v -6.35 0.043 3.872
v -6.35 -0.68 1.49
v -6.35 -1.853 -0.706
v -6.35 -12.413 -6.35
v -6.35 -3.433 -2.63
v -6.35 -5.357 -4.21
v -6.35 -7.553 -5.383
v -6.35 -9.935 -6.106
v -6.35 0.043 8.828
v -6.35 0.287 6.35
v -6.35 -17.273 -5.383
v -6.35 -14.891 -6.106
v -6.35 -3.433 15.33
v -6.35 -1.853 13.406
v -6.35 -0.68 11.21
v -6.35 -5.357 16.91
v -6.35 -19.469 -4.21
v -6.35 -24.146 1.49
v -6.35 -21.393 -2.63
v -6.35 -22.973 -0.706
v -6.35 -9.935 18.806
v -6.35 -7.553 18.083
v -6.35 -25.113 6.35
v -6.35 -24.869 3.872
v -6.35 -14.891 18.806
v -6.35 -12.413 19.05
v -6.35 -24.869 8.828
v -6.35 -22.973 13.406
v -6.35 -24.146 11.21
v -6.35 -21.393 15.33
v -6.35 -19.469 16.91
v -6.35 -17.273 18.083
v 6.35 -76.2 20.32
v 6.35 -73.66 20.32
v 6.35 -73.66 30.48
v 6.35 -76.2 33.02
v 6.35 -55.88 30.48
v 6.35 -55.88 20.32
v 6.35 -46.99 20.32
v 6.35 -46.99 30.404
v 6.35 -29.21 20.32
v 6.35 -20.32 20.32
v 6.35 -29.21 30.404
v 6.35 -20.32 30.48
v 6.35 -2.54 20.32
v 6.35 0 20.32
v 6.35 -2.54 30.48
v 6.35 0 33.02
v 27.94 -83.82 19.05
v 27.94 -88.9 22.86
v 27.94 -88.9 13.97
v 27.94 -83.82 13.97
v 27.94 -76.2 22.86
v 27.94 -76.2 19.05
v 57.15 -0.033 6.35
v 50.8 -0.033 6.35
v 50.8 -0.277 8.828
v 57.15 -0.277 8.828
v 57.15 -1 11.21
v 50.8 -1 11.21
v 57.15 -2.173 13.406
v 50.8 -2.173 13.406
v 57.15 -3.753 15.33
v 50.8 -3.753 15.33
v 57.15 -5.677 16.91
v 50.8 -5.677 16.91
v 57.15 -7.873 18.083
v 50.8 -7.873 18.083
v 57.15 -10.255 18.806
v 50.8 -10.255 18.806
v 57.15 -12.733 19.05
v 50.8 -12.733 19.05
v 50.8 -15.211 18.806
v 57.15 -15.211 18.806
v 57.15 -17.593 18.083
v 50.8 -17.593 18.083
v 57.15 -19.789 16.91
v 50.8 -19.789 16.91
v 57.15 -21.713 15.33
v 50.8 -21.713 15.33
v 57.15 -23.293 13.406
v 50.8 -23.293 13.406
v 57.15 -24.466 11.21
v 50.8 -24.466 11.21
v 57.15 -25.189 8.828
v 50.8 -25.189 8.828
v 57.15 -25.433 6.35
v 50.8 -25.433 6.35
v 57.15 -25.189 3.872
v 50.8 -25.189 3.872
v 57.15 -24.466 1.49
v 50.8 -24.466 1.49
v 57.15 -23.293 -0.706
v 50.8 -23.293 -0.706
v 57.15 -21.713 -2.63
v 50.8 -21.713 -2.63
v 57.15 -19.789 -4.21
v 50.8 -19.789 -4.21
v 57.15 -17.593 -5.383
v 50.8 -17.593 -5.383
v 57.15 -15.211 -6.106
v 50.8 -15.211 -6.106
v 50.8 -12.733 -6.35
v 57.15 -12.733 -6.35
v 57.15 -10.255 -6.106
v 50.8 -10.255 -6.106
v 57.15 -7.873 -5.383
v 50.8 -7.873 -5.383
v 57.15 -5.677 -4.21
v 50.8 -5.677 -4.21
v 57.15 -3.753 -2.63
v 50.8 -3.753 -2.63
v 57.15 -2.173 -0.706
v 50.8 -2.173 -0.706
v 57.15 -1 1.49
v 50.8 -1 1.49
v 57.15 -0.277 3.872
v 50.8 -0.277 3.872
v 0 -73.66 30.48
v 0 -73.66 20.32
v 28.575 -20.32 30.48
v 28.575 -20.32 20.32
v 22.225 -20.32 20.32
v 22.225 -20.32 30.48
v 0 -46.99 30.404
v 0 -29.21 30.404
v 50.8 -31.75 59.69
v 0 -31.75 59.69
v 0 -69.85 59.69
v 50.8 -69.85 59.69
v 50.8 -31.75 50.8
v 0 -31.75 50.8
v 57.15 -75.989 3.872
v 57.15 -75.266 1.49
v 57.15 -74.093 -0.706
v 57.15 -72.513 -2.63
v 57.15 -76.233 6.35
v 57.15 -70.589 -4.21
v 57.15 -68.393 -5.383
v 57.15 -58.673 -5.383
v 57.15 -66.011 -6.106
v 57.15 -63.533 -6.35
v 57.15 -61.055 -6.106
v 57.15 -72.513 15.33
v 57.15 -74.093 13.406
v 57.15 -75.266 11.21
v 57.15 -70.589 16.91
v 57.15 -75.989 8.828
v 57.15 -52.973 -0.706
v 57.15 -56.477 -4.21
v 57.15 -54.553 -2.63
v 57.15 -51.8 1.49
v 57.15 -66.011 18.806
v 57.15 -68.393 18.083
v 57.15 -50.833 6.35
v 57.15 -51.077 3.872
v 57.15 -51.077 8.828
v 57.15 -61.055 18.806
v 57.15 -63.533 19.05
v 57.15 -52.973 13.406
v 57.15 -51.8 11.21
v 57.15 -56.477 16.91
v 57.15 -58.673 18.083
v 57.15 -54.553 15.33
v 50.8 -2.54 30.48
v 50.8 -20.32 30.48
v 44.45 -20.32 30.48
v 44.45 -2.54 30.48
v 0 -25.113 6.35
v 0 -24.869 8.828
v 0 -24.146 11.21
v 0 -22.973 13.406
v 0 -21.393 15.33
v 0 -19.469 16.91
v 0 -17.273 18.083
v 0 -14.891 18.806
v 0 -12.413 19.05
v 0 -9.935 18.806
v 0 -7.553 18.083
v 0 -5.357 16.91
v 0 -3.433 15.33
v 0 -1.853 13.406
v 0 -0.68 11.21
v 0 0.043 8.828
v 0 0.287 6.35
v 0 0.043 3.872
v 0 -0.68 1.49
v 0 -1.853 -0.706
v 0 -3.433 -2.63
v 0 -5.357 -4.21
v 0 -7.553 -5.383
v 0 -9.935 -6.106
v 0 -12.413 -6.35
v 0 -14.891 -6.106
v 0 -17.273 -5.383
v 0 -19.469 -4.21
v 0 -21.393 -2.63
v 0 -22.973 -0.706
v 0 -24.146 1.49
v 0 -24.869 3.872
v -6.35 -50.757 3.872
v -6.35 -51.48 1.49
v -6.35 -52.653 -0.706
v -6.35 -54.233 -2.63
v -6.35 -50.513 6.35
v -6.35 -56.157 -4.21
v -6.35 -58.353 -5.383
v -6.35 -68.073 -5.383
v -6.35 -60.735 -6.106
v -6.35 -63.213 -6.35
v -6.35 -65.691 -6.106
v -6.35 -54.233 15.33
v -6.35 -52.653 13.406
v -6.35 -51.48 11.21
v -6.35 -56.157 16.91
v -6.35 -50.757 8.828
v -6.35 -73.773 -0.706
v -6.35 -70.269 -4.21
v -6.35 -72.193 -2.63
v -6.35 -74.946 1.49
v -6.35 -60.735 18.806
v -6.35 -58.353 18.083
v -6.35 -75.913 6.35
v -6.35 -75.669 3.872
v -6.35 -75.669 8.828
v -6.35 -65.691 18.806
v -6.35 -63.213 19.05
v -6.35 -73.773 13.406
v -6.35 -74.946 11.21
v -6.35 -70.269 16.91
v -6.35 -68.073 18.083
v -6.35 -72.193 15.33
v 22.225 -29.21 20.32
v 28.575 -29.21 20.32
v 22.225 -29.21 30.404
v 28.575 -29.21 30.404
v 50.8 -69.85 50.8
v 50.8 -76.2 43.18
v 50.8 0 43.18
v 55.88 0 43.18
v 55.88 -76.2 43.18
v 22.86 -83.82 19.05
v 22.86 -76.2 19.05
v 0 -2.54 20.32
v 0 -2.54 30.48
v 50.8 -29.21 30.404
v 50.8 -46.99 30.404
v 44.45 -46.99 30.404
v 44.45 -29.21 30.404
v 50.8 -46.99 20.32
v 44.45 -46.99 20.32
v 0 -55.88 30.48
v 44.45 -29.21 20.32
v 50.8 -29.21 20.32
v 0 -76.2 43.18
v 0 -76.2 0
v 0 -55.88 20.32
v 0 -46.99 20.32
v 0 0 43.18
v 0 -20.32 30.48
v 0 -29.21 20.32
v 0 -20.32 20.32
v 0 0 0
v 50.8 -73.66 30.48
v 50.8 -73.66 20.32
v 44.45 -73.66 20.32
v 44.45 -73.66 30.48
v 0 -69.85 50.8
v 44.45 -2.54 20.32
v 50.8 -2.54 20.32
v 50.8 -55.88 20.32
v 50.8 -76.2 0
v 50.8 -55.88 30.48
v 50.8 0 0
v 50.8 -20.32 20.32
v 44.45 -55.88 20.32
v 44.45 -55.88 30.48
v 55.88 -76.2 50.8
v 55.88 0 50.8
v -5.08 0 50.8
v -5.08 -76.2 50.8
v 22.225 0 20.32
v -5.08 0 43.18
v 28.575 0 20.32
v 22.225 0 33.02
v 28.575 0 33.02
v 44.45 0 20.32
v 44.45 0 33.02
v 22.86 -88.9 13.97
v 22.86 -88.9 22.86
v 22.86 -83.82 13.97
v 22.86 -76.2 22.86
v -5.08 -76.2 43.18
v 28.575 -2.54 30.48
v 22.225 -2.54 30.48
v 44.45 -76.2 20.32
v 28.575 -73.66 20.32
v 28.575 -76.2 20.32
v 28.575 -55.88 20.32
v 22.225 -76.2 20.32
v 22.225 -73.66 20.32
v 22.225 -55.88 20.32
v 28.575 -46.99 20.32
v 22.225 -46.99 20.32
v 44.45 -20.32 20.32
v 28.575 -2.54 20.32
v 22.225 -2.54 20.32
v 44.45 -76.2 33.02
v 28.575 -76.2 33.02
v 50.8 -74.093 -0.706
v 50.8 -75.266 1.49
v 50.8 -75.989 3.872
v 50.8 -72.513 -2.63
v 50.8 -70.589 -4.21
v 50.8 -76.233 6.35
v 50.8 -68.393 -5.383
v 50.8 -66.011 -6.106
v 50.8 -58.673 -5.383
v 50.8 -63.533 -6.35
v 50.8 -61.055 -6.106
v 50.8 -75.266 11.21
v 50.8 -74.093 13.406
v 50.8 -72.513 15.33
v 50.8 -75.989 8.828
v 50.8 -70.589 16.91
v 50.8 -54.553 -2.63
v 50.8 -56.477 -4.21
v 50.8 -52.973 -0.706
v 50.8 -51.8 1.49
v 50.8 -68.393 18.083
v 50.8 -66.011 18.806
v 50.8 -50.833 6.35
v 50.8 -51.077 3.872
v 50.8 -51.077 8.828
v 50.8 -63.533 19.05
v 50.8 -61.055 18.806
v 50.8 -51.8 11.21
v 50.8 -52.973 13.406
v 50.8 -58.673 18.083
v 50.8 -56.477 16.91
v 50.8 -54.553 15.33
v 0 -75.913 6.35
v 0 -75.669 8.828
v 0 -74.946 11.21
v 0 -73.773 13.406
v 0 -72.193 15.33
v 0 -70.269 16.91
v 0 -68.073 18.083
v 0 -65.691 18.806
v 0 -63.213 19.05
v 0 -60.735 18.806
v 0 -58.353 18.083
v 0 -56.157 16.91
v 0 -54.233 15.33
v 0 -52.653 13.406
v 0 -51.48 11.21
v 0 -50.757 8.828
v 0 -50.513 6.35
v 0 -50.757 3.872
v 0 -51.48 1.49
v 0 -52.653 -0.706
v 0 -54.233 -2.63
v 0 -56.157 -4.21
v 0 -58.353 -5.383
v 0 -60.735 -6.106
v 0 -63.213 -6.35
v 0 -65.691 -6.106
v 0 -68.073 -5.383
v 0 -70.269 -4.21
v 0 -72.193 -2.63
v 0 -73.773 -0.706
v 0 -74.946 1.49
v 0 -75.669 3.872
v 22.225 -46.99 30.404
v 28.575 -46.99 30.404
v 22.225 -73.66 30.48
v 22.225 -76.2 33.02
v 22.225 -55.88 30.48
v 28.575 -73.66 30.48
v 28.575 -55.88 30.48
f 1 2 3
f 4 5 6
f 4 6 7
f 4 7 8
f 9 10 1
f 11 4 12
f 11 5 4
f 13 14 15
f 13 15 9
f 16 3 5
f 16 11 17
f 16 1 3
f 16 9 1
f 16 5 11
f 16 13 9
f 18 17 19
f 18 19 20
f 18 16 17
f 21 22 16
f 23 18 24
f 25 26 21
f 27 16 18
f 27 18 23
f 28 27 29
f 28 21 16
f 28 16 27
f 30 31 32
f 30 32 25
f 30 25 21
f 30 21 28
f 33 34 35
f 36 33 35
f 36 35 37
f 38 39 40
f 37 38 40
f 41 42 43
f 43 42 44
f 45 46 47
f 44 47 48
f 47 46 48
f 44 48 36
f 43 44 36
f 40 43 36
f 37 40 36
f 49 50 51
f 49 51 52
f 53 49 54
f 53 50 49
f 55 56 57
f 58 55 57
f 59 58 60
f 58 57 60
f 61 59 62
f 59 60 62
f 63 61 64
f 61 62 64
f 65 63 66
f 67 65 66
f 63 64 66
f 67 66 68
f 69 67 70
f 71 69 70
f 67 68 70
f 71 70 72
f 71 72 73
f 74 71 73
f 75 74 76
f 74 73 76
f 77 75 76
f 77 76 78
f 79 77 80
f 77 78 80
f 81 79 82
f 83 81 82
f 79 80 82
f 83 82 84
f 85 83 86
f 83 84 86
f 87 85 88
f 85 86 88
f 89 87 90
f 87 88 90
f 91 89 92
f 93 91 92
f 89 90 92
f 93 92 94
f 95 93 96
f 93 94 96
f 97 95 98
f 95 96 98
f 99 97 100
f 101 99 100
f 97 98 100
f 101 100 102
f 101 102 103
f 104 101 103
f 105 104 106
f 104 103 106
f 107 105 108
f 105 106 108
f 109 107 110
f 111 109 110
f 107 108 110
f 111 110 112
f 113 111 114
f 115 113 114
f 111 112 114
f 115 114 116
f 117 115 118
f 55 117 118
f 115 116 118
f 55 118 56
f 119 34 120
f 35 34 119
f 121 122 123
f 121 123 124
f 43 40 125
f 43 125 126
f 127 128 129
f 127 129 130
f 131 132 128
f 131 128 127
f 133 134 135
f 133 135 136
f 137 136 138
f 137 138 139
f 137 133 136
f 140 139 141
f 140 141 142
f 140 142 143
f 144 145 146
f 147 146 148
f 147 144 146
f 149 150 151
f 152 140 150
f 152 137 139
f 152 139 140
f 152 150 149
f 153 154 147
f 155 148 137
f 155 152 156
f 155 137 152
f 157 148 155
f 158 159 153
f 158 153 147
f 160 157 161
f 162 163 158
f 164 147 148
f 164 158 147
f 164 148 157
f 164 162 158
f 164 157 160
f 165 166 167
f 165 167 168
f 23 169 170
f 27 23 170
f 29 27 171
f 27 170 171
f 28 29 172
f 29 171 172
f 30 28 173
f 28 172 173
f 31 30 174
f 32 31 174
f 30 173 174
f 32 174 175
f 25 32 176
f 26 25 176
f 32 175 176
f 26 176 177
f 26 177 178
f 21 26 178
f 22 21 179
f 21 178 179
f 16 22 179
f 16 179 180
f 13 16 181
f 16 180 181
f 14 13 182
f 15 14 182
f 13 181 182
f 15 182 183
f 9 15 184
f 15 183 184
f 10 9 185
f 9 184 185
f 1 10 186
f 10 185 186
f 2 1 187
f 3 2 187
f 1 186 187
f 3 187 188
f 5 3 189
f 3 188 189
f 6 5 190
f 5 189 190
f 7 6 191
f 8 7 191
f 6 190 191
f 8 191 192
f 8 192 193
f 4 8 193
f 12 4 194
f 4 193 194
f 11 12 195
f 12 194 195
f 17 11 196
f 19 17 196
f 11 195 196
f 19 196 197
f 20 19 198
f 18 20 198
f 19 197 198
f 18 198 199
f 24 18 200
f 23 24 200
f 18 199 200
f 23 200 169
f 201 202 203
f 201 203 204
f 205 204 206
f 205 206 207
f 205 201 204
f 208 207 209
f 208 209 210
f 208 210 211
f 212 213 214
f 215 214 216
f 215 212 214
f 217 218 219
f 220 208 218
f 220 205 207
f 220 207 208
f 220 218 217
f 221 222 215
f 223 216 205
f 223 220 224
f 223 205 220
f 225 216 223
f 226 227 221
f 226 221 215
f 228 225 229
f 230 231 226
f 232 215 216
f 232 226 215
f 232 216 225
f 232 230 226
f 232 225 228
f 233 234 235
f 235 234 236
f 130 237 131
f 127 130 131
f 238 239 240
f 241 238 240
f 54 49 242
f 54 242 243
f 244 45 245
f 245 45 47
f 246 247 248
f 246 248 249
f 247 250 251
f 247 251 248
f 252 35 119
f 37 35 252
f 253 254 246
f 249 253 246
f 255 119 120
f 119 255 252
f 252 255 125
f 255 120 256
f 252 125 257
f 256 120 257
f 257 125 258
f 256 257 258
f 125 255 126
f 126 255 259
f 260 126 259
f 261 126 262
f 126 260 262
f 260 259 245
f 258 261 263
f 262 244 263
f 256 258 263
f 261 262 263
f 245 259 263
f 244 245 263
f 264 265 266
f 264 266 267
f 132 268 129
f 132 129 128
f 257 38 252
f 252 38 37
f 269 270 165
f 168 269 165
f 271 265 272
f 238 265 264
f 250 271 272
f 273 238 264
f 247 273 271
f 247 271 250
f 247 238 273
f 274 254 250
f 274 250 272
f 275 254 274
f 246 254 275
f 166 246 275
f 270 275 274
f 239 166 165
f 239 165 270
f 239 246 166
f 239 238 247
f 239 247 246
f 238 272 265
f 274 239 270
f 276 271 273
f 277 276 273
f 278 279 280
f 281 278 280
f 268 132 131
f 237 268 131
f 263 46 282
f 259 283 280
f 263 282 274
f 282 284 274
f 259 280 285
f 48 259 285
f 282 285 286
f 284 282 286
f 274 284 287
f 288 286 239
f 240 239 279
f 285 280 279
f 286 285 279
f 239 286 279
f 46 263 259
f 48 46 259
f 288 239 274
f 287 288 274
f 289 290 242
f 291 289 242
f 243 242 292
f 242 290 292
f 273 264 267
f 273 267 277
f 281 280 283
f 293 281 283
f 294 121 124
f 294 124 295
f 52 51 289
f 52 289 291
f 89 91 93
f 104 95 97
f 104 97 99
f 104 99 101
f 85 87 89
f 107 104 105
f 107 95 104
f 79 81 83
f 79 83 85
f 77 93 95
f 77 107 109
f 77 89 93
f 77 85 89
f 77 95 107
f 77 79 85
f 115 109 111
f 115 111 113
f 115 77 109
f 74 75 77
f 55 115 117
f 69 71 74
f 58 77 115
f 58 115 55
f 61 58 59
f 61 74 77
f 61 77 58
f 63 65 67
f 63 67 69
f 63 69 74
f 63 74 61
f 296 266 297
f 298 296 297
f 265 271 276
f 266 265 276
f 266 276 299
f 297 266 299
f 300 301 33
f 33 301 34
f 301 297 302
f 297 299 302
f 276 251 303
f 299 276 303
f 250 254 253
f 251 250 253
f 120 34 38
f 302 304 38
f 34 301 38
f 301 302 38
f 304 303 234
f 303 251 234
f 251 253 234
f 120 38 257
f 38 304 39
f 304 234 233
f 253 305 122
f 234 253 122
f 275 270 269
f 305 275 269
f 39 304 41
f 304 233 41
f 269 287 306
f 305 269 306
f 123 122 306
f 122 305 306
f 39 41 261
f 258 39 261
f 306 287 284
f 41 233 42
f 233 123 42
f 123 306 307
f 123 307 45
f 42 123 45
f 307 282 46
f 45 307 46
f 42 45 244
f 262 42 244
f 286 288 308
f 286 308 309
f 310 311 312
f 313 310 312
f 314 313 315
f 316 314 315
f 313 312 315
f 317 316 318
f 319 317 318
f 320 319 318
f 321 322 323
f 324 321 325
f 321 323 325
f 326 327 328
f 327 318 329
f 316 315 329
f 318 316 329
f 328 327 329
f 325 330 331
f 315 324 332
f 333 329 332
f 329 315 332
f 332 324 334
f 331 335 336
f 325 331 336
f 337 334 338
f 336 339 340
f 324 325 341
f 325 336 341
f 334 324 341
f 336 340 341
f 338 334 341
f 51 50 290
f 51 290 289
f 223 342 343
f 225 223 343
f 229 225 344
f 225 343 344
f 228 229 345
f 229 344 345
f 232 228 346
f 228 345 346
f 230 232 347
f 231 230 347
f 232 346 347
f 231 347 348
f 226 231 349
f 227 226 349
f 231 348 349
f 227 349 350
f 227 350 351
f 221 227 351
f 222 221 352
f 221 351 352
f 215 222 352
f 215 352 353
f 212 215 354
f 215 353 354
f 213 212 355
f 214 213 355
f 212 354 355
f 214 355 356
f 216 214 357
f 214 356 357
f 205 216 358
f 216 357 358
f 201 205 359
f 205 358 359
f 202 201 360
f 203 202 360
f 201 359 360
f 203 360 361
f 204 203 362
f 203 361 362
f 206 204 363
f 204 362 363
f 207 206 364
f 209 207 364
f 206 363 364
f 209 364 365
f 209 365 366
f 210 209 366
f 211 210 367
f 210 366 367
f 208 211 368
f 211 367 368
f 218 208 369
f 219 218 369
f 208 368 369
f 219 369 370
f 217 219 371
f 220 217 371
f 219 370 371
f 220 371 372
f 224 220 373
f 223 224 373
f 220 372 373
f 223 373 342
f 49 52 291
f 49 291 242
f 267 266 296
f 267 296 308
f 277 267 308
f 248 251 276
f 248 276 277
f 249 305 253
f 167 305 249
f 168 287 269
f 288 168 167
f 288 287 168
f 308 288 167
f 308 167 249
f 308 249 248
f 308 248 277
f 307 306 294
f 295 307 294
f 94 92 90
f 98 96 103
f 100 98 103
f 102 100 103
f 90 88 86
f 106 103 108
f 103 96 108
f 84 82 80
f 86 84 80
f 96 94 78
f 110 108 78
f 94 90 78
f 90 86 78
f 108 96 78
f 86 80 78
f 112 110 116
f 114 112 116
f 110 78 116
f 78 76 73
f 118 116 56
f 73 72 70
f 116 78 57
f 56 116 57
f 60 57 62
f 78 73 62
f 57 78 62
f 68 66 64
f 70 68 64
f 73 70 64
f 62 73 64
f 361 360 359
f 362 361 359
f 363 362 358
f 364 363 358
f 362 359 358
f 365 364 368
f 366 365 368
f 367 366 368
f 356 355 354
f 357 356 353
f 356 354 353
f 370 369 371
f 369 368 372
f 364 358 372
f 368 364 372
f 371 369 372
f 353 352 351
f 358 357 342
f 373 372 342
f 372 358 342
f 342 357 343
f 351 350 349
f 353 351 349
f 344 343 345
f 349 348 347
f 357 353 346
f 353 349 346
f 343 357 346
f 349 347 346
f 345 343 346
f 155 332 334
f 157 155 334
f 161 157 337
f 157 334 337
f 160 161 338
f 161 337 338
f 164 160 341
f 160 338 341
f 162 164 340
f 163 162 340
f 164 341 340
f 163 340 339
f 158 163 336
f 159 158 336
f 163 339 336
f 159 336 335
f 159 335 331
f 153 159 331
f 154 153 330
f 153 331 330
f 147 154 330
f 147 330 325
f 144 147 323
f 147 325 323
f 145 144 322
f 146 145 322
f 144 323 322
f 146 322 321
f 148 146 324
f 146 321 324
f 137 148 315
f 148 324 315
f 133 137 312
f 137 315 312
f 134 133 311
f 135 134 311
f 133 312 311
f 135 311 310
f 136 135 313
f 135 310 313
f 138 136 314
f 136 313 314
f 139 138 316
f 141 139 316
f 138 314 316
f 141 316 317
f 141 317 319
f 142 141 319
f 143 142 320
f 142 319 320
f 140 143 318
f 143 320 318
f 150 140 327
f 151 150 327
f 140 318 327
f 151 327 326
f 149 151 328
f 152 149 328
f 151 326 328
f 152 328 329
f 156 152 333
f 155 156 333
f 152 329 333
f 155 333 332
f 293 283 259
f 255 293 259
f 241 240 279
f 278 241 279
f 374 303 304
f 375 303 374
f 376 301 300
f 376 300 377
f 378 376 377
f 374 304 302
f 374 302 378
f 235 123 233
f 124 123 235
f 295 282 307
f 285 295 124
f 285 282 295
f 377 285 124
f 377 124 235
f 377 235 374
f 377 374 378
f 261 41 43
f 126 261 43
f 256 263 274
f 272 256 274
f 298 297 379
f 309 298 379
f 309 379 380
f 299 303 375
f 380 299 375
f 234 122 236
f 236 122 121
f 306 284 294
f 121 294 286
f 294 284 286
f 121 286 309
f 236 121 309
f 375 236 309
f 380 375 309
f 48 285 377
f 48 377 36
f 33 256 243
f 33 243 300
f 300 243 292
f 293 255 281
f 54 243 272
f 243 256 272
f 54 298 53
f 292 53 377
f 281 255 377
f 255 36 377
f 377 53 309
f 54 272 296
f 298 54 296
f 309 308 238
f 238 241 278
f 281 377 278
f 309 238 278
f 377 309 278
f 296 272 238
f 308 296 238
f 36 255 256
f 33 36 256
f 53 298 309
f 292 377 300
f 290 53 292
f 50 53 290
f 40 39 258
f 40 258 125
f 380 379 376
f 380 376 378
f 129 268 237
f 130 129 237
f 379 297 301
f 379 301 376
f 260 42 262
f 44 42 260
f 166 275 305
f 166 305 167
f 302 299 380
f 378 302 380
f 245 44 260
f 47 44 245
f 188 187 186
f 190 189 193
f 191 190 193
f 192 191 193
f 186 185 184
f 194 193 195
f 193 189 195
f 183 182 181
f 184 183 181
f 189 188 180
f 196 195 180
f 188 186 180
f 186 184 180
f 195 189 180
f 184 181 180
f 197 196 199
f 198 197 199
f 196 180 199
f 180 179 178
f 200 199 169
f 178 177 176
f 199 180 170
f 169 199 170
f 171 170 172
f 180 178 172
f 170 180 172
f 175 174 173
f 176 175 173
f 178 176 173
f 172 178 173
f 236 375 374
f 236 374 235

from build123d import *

# Parameters (mm, degrees)
F1_DEPTH  = 76.2
F2_W      = 17.78
F2_H      = 10.16
F2_H_2    = 10.084178
F3_DEPTH  = 50.8
F4_R      = 12.7
F5_DEPTH  = 6.35
F7_W      = 15.875
F7_H      = 12.7
F8_DEPTH  = 76.2
F9_W      = 50.8
F9_H      = 38.1
F10_DEPTH = 8.89
F12_DEPTH = 27.94
F13_DEPTH = 22.86
F6_R      = 12.7
F14_DEPTH = 6.35


with BuildPart() as f1:
    # F0 (on Front) → F1 (new body)
    with BuildSketch(Plane.XZ):
        Polygon((55.88, 50.8), (0, 50.8), (-5.08, 50.8), (-5.08, 43.18), (0, 43.18), (0, 0), (50.8, 0), (50.8, 43.18), (55.88, 43.18), align=None)
    extrude(amount=F1_DEPTH)

    # F2 (on face) → F3 (cut)
    with BuildSketch(Plane.YZ.offset(50.8)):
        with Locations((-64.77, 25.4)):
            Rectangle(F2_W, F2_H)
        with Locations((-38.1, 25.362089)):
            Rectangle(F2_W, F2_H_2)
        with Locations((-11.43, 25.4)):
            Rectangle(F2_W, F2_H)
    extrude(amount=-F3_DEPTH, mode=Mode.SUBTRACT)

    # F7 (on face) → F8 (cut)
    with BuildSketch(Plane(origin=(0, 0, 0), x_dir=(-1, 0, 0), z_dir=(0, 1, 0))):
        with Locations((-36.5125, 26.67)):
            Rectangle(F7_W, F7_H)
        with Locations((-14.2875, 26.67)):
            Rectangle(F7_W, F7_H)
    extrude(amount=-F8_DEPTH, mode=Mode.SUBTRACT)

    # F11 (on face) → F12 (join)
    with BuildSketch(Plane.YZ.offset(50.8)):
        Polygon((-76.2, 19.05), (-76.2, 22.86), (-88.9, 22.86), (-88.9, 13.97), (-83.82, 13.97), (-83.82, 19.05), align=None)
    extrude(amount=-F12_DEPTH)

    # F11 (on face) → F13 (cut)
    with BuildSketch(Plane.YZ.offset(50.8)):
        Polygon((-76.2, 19.05), (-76.2, 22.86), (-88.9, 22.86), (-88.9, 13.97), (-83.82, 13.97), (-83.82, 19.05), align=None)
    extrude(amount=-F13_DEPTH, mode=Mode.SUBTRACT)


with BuildPart() as f5:
    # F4 (on face) → F5 (new body)
    with BuildSketch(Plane.YZ.offset(50.8)):
        with Locations((-63.533098, 6.35)):
            Circle(F4_R)
        with Locations((-12.733098, 6.35)):
            Circle(F4_R)
    extrude(amount=F5_DEPTH)


with BuildPart() as f10:
    # F9 (on face) → F10 (new body)
    with BuildSketch(Plane.XY.offset(50.8)):
        with Locations((25.4, -50.8)):
            Rectangle(F9_W, F9_H)
    extrude(amount=F10_DEPTH)


with BuildPart() as f14:
    # F6 (on face) → F14 (new body)
    with BuildSketch(Plane(origin=(0, 0, 0), x_dir=(0, -1, 0), z_dir=(-1, 0, 0))):
        with Locations((63.213013, 6.35)):
            Circle(F6_R)
        with Locations((12.413013, 6.35)):
            Circle(F6_R)
    extrude(amount=F14_DEPTH)


solid = Compound([f1.part, f5.part, f10.part, f14.part])
